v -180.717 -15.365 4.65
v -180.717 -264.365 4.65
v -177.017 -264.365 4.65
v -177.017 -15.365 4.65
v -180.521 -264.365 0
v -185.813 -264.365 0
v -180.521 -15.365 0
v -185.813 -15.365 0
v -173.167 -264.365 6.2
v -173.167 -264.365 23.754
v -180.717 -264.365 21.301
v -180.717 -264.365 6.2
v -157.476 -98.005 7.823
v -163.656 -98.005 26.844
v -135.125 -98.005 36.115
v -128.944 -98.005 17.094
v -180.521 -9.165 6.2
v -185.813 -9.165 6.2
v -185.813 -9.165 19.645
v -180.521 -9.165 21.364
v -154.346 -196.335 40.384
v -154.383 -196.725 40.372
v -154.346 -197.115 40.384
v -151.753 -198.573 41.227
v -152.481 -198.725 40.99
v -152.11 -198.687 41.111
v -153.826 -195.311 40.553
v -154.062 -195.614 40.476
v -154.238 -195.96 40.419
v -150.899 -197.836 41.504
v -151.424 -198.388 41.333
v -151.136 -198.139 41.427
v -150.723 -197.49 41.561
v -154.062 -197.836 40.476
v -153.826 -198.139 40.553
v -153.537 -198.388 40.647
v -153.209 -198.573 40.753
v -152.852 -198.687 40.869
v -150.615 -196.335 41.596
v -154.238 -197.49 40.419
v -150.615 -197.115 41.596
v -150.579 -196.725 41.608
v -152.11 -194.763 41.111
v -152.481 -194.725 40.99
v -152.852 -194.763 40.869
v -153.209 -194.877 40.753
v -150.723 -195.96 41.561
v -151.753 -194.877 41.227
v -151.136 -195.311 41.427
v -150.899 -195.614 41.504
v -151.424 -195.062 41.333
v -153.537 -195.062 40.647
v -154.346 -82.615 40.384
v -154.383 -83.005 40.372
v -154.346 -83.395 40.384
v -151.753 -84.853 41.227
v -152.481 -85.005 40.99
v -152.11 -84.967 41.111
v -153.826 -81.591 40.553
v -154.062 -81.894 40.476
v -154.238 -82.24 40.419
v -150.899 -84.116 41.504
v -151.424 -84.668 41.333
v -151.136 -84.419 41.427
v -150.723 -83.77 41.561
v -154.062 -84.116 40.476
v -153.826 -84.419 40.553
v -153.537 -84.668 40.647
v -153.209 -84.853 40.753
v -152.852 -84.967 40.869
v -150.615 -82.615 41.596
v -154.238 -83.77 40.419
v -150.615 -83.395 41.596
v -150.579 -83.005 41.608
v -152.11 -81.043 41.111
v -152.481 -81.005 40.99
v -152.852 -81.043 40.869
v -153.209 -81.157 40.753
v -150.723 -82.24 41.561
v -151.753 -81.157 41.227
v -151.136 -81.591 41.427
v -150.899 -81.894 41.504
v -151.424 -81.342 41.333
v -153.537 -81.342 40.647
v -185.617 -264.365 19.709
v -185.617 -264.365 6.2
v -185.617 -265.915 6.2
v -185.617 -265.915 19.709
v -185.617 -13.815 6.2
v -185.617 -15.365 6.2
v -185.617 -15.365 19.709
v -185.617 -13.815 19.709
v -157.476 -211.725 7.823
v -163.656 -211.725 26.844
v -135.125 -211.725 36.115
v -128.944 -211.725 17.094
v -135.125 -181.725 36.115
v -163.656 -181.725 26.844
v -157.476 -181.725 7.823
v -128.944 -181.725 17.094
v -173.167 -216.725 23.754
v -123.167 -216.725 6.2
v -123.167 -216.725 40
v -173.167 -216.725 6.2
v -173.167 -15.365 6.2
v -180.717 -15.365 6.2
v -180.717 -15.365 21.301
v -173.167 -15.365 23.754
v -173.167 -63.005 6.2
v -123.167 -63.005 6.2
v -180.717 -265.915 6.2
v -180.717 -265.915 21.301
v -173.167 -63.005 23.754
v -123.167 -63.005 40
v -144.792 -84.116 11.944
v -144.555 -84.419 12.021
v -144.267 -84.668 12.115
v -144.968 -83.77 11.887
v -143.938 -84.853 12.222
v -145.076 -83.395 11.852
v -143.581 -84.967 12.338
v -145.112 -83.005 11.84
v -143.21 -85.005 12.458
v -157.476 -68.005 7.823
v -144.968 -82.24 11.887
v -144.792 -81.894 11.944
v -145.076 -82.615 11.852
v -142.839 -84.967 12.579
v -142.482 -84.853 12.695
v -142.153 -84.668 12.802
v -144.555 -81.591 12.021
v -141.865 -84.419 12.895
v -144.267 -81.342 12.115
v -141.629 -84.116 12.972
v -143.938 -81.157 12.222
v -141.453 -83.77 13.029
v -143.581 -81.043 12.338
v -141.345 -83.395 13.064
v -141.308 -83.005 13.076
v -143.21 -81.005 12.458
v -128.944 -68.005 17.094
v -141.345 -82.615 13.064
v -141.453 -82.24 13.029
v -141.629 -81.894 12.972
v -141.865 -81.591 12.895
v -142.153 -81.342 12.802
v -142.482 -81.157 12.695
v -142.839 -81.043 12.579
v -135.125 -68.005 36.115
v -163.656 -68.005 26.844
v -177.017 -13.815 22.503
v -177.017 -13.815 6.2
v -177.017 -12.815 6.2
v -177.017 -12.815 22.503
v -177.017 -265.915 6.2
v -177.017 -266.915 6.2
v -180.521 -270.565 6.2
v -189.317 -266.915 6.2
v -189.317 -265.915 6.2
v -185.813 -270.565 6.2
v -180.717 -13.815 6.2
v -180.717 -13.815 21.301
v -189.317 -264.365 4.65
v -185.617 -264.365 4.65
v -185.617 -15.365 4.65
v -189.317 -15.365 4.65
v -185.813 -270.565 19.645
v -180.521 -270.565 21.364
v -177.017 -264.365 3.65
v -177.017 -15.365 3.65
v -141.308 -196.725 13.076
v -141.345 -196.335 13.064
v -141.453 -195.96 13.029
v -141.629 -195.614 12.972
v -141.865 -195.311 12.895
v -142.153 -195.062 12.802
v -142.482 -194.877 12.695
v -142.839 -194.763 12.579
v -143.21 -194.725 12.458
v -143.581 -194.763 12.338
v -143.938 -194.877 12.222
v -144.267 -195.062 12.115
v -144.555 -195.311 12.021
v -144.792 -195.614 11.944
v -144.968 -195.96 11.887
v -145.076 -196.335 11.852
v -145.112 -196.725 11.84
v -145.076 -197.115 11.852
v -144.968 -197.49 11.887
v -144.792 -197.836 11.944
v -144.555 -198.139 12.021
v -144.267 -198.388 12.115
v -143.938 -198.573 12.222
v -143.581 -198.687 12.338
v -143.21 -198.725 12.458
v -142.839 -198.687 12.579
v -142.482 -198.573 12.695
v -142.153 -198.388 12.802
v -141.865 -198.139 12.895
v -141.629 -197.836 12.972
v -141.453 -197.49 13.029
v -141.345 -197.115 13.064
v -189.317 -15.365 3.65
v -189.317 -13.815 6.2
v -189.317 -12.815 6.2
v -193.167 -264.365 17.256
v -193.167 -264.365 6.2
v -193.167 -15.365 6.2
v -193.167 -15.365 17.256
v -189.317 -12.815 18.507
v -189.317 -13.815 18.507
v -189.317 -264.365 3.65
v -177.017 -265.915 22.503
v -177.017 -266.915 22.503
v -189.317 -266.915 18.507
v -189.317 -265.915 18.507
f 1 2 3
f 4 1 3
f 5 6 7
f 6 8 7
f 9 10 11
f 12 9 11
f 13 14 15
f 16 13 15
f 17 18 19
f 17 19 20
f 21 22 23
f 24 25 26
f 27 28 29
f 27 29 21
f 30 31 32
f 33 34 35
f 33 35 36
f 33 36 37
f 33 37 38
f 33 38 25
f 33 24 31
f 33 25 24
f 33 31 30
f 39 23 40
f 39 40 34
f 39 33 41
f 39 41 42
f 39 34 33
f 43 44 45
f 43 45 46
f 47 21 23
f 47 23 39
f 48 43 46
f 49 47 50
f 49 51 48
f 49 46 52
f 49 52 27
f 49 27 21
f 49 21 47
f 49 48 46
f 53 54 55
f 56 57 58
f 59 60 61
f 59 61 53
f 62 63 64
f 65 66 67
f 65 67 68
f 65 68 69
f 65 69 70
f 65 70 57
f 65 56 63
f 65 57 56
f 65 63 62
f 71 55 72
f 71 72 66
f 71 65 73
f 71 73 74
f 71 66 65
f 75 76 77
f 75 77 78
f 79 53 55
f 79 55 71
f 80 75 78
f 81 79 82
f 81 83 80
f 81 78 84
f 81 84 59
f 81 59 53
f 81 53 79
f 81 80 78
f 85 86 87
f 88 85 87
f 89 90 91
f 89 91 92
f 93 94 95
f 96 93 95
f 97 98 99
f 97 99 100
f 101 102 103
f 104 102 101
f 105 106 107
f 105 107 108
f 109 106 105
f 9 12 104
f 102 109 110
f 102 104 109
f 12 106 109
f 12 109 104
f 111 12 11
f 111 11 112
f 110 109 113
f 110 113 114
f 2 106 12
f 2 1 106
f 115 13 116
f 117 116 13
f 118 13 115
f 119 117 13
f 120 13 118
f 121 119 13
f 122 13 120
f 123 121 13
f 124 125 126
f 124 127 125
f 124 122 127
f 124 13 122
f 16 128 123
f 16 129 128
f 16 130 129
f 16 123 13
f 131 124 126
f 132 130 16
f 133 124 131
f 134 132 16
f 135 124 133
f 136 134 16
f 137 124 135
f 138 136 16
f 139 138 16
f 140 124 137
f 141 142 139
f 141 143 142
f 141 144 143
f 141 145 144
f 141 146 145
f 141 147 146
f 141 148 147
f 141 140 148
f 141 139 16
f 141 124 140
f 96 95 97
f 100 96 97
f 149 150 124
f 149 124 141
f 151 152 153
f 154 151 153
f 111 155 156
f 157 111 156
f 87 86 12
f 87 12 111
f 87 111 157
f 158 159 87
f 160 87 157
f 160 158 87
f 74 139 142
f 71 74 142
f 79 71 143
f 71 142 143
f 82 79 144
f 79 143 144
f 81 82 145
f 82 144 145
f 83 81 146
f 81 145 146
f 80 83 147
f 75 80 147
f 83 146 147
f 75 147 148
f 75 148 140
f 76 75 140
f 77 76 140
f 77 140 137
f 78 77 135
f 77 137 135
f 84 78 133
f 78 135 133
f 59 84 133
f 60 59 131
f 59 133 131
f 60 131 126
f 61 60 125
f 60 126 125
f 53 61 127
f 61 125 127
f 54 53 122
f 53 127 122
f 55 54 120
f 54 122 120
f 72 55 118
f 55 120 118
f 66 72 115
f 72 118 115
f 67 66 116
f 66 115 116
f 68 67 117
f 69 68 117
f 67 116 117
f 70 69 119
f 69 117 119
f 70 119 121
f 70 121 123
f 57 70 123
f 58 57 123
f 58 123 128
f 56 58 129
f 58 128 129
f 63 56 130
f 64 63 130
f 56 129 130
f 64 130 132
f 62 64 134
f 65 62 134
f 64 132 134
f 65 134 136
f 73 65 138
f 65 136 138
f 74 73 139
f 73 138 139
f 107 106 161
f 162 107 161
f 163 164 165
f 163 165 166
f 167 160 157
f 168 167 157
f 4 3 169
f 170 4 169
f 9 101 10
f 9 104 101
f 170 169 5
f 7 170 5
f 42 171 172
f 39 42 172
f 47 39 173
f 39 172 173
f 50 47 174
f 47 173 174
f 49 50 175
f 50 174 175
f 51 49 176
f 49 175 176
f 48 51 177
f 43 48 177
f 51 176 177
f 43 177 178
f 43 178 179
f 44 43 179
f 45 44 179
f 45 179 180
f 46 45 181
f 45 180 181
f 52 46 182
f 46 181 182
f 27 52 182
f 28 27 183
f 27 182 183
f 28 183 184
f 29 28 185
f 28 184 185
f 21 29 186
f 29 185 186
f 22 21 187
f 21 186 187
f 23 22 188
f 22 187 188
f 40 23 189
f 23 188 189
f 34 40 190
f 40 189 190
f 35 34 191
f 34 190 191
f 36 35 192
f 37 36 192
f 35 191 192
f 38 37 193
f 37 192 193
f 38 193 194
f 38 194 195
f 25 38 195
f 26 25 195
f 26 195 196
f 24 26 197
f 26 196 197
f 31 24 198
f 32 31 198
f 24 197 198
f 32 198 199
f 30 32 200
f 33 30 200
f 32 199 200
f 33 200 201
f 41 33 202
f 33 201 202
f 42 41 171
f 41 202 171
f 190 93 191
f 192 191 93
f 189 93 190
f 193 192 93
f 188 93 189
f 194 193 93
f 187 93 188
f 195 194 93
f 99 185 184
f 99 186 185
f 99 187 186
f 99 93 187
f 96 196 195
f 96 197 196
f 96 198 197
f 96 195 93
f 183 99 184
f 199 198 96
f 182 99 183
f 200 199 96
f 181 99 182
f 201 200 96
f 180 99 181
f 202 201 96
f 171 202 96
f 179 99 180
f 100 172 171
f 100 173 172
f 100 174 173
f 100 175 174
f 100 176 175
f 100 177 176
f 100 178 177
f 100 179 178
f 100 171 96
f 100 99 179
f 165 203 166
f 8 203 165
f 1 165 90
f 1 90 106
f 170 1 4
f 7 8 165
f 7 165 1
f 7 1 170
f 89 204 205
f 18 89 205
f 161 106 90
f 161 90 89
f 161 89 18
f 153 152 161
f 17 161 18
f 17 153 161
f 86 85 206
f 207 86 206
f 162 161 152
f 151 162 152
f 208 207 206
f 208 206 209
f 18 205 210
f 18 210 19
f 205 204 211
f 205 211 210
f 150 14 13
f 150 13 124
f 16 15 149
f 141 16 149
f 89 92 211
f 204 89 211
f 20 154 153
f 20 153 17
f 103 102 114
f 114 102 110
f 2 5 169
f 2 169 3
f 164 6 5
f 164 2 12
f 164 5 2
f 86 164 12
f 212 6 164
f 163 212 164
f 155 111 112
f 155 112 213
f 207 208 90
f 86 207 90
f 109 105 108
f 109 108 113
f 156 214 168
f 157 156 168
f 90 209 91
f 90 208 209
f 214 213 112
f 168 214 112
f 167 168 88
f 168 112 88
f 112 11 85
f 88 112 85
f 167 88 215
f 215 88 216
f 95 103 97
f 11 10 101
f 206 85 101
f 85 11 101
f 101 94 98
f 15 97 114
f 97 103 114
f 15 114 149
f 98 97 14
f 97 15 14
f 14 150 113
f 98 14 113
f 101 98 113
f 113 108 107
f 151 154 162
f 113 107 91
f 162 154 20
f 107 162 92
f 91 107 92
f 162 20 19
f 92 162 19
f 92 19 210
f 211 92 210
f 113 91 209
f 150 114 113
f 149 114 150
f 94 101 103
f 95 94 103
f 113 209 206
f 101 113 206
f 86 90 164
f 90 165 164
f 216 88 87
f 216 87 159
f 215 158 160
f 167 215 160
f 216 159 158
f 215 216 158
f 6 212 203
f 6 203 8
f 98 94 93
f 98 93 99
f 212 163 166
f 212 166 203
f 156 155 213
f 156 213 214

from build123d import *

# Parameters (mm, degrees)
ESQUISSE1_W                   = 70
ESQUISSE1_H                   = 261.4
BOSS_EXTRU_1_DEPTH            = 40
ENL_V_MAT_EXTRU_1_DEPTH       = 335.841640665
ENL_V_MAT_EXTRU_1_DEPTH_BACK  = 40
ENL_V_MAT_EXTRU_2_DEPTH       = 335.841640665
ENL_V_MAT_EXTRU_2_DEPTH_BACK  = 40
ENL_V_MAT_EXTRU_3_DEPTH       = 287.347052656
ENL_V_MAT_EXTRU_3_DEPTH_BACK  = 165
ENL_V_MAT_EXTRU_4_DEPTH       = 328.480443637
ENL_V_MAT_EXTRU_4_DEPTH_BACK  = 261.4
ENL_V_MAT_EXTRU_5_DEPTH       = 328.480443637
ENL_V_MAT_EXTRU_5_DEPTH_BACK  = 261.4
ENL_V_MAT_EXTRU_6_DEPTH       = 335.841640665
ENL_V_MAT_EXTRU_6_DEPTH_BACK  = 40
ENL_V_MAT_EXTRU_8_DEPTH       = 335.841640665
ENL_V_MAT_EXTRU_8_DEPTH_BACK  = 40
ENL_V_MAT_EXTRU_9_DEPTH       = 281.544908808
ENL_V_MAT_EXTRU_9_DEPTH_BACK  = 40
ENL_V_MAT_EXTRU_10_DEPTH      = 335.841640665
ENL_V_MAT_EXTRU_10_DEPTH_BACK = 40
ENL_V_MAT_EXTRU_12_DEPTH      = 335.841640665
ENL_V_MAT_EXTRU_12_DEPTH_BACK = 40
ENL_V_MAT_EXTRU_14_DEPTH      = 280.494983601
ENL_V_MAT_EXTRU_14_DEPTH_BACK = 4.9
ENL_V_MAT_EXTRU_30_DEPTH      = 323.553128903
ENL_V_MAT_EXTRU_30_DEPTH_BACK = 323.553128903
ESQUISSE33_W                  = 30
ESQUISSE33_H                  = 30
ENL_V_MAT_EXTRU_34_DEPTH      = 20
ESQUISSE36_W                  = 30
ESQUISSE36_H                  = 30
ENL_V_MAT_EXTRU_35_DEPTH      = 20
ESQUISSE38_R                  = 2
BOSS_EXTRU_2_DEPTH            = 30
ESQUISSE39_R                  = 2
BOSS_EXTRU_3_DEPTH            = 30


with BuildPart() as part:
    # Esquisse1 → Boss.-Extru.1 (new body)
    with BuildSketch(Plane.XY):
        with Locations((-158.166976901, -139.865044598)):
            Rectangle(ESQUISSE1_W, ESQUISSE1_H)
    extrude(amount=BOSS_EXTRU_1_DEPTH)

    # Esquisse3 → Enlèv. mat.-Extru.1 (cut, two sides: drawn at the far end of the back side and taken through both)
    with BuildSketch(Plane.XY.offset(40).offset(-ENL_V_MAT_EXTRU_1_DEPTH_BACK)):
        Polygon((-173.166976901, 533.112927894), (-173.166976901, -9.165044598), (-173.166976901, -63.005044598), (-123.166976901, -63.005044598), (419.110995591, -63.005044598), (1188.481875045, 701.409795425), (596.203902553, 1297.527767917), align=None)
    extrude(amount=ENL_V_MAT_EXTRU_1_DEPTH + ENL_V_MAT_EXTRU_1_DEPTH_BACK, mode=Mode.SUBTRACT)

    # Esquisse4 → Enlèv. mat.-Extru.2 (cut, two sides: drawn at the far end of the back side and taken through both)
    with BuildSketch(Plane.XY.offset(40).offset(-ENL_V_MAT_EXTRU_2_DEPTH_BACK)):
        Polygon((-173.166976901, -812.84301709), (-173.166976901, -270.565044598), (-173.166976901, -216.725044598), (-123.166976901, -216.725044598), (419.110995591, -216.725044598), (1188.481875045, -981.139884621), (596.203902553, -1577.257857113), align=None)
    extrude(amount=ENL_V_MAT_EXTRU_2_DEPTH + ENL_V_MAT_EXTRU_2_DEPTH_BACK, mode=Mode.SUBTRACT)

    # Esquisse6 → Enlèv. mat.-Extru.3 (cut, two sides: drawn at the far end of the back side and taken through both)
    with BuildSketch(Plane(origin=(0, -63.005044598, 0), x_dir=(1, 0, 0), z_dir=(0, 1, 0)).offset(-ENL_V_MAT_EXTRU_3_DEPTH_BACK)):
        Polygon((42.299289537, -6.2), (-123.166976901, -6.2), (-173.166976901, -6.2), (-173.166976901, 0), (-173.166976901, 165.466266437), (33.046852916, 424.294776666), (248.513119354, 252.628510228), align=None)
    extrude(amount=ENL_V_MAT_EXTRU_3_DEPTH + ENL_V_MAT_EXTRU_3_DEPTH_BACK, mode=Mode.SUBTRACT)

    # Esquisse7 → Enlèv. mat.-Extru.4 (cut, two sides: drawn at the far end of the back side and taken through both)
    with BuildSketch(Plane(origin=(0, -9.165044598, 0), x_dir=(1, 0, 0), z_dir=(0, 1, 0)).offset(-ENL_V_MAT_EXTRU_4_DEPTH_BACK)):
        Polygon((-23.31660268, -6.2), (-173.166976901, -6.2), (-180.716976901, -6.2), (-180.716976901, -4.65), (-177.016976901, -4.65), (-177.016976901, -3.65), (-180.521416942, 0), (-284.304352032, 108.093649388), (-164.080204276, 382.623598415), (96.907545076, 268.329949026), align=None)
    extrude(amount=ENL_V_MAT_EXTRU_4_DEPTH + ENL_V_MAT_EXTRU_4_DEPTH_BACK, mode=Mode.SUBTRACT)

    # Esquisse8 → Enlèv. mat.-Extru.5 (cut, two sides: drawn at the far end of the back side and taken through both)
    with BuildSketch(Plane(origin=(0, -9.165044598, 0), x_dir=(1, 0, 0), z_dir=(0, 1, 0)).offset(-ENL_V_MAT_EXTRU_5_DEPTH_BACK)):
        Polygon((-358.633243338, -6.2), (-193.166976901, -6.2), (-185.616976901, -6.2), (-185.616976901, -4.65), (-189.316976901, -4.65), (-189.316976901, -3.65), (-185.81253686, 0), (-71.214392687, 119.358077569), (-203.692164198, 422.617012095), (-491.11101485, 297.058934527), align=None)
    extrude(amount=ENL_V_MAT_EXTRU_5_DEPTH + ENL_V_MAT_EXTRU_5_DEPTH_BACK, mode=Mode.SUBTRACT)

    # Esquisse9 → Enlèv. mat.-Extru.6 (cut, two sides: drawn at the far end of the back side and taken through both)
    with BuildSketch(Plane.XY.offset(40).offset(-ENL_V_MAT_EXTRU_6_DEPTH_BACK)):
        Polygon((-740.770645722, -15.365044598), (-193.166976901, -15.365044598), (-185.616976901, -15.365044598), (-185.616976901, -13.815044598), (-189.316976901, -13.815044598), (-189.316976901, -12.815044598), (-185.81253686, -9.165044598), (193.445214828, 385.845507022), (-238.735419917, 1392.174981587), (-1172.951280468, 990.964429967), align=None)
    extrude(amount=ENL_V_MAT_EXTRU_6_DEPTH + ENL_V_MAT_EXTRU_6_DEPTH_BACK, mode=Mode.SUBTRACT)

    # Esquisse10 → Enlèv. mat.-Extru.8 (cut, two sides: drawn at the far end of the back side and taken through both)
    with BuildSketch(Plane.XY.offset(40).offset(-ENL_V_MAT_EXTRU_8_DEPTH_BACK)):
        Polygon((372.069388801, -15.365044598), (-173.166976901, -15.365044598), (-180.716976901, -15.365044598), (-180.716976901, -13.815044598), (-177.016976901, -13.815044598), (-177.016976901, -12.815044598), (-180.521416942, -9.165044598), (-558.13962874, 384.13786742), (-127.815363107, 1386.111821344), (802.393654434, 986.608909326), align=None)
    extrude(amount=ENL_V_MAT_EXTRU_8_DEPTH + ENL_V_MAT_EXTRU_8_DEPTH_BACK, mode=Mode.SUBTRACT)

    # Esquisse11 → Enlèv. mat.-Extru.9 (cut, two sides: drawn at the far end of the back side and taken through both)
    with BuildSketch(Plane.ZY.offset(185.616976901).offset(-ENL_V_MAT_EXTRU_9_DEPTH_BACK)):
        Polygon((-537.152349895, -15.365044598), (0, -15.365044598), (6.2, -15.365044598), (6.2, -9.165044598), (6.2, 527.987305297), (-753.448138282, 1287.635443579), (-1296.800488177, 744.283093684), align=None)
    extrude(amount=ENL_V_MAT_EXTRU_9_DEPTH + ENL_V_MAT_EXTRU_9_DEPTH_BACK, mode=Mode.SUBTRACT)

    # Esquisse12 → Enlèv. mat.-Extru.10 (cut, two sides: drawn at the far end of the back side and taken through both)
    with BuildSketch(Plane.XY.offset(40).offset(-ENL_V_MAT_EXTRU_10_DEPTH_BACK)):
        Polygon((372.069388801, -264.365044598), (-173.166976901, -264.365044598), (-180.716976901, -264.365044598), (-180.716976901, -265.915044598), (-177.016976901, -265.915044598), (-177.016976901, -266.915044598), (-180.521416942, -270.565044598), (-558.13962874, -663.867956616), (-127.815363107, -1665.84191054), (802.393654434, -1266.338998522), align=None)
    extrude(amount=ENL_V_MAT_EXTRU_10_DEPTH + ENL_V_MAT_EXTRU_10_DEPTH_BACK, mode=Mode.SUBTRACT)

    # Esquisse13 → Enlèv. mat.-Extru.12 (cut, two sides: drawn at the far end of the back side and taken through both)
    with BuildSketch(Plane.XY.offset(40).offset(-ENL_V_MAT_EXTRU_12_DEPTH_BACK)):
        Polygon((-740.770645722, -264.365044598), (-193.166976901, -264.365044598), (-185.616976901, -264.365044598), (-185.616976901, -265.915044598), (-189.316976901, -265.915044598), (-189.316976901, -266.915044598), (-185.81253686, -270.565044598), (193.445214828, -665.575596218), (-238.735419917, -1671.905070783), (-1172.951280468, -1270.694519163), align=None)
    extrude(amount=ENL_V_MAT_EXTRU_12_DEPTH + ENL_V_MAT_EXTRU_12_DEPTH_BACK, mode=Mode.SUBTRACT)

    # Esquisse16 → Enlèv. mat.-Extru.14 (cut, two sides: drawn at the far end of the back side and taken through both)
    with BuildSketch(Plane(origin=(-180.716976901, 0, 0), x_dir=(0, 0, -1), z_dir=(1, 0, 0)).offset(-ENL_V_MAT_EXTRU_14_DEPTH_BACK)):
        Polygon((537.152349895, -264.365044598), (0, -264.365044598), (-6.2, -264.365044598), (-6.2, -270.565044598), (-6.2, -807.717394493), (753.448138282, -1567.365532776), (1296.800488177, -1024.01318288), align=None)
    extrude(amount=ENL_V_MAT_EXTRU_14_DEPTH + ENL_V_MAT_EXTRU_14_DEPTH_BACK, mode=Mode.SUBTRACT)


with BuildPart() as enl_v_mat_extru_14_kept_piece:
    # of the separate pieces the step leaves, the one the design keeps (enl_v_mat_extru_14_pieces_kept)
    add(part.part.solids().sort_by_distance((-193.166976901, -264.365044598, 6.2))[0])

    # Esquisse32 → Enlèv. mat.-Extru.30 (cut, two sides: drawn at the far end of the back side and taken through both)
    with BuildSketch(Plane(origin=(0, -264.365044598, 0), x_dir=(-1, 0, 0), z_dir=(0, -1, 0)).offset(-ENL_V_MAT_EXTRU_30_DEPTH_BACK)):
        Polygon((364.412131867, -40), (193.166976901, -40), (123.166976901, -40), (193.166976901, -17.255621264), (356.030797415, 35.662041825), (696.438947848, 73.370177768), (704.8202823, -2.291864057), align=None)
    extrude(amount=ENL_V_MAT_EXTRU_30_DEPTH + ENL_V_MAT_EXTRU_30_DEPTH_BACK, mode=Mode.SUBTRACT)

    # Esquisse33 → Enlèv. mat.-Extru.34 (cut)
    with BuildSketch(Plane(origin=(-23.517104767, 0, 72.378206183), x_dir=(0.9510565162951555, 0, 0.3090169943749416), z_dir=(-0.3090169943749416, 0, 0.9510565162951555))):
        with Locations((-132.351187411, -83.005044598)):
            Rectangle(ESQUISSE33_W, ESQUISSE33_H)
    extrude(amount=-ENL_V_MAT_EXTRU_34_DEPTH, mode=Mode.SUBTRACT)

    # Esquisse36 → Enlèv. mat.-Extru.35 (cut)
    with BuildSketch(Plane(origin=(-23.517104767, 0, 72.378206183), x_dir=(0.9510565162951555, 0, 0.3090169943749416), z_dir=(-0.3090169943749416, 0, 0.9510565162951555))):
        with Locations((-132.351187411, -196.725044598)):
            Rectangle(ESQUISSE36_W, ESQUISSE36_H)
    extrude(amount=-ENL_V_MAT_EXTRU_35_DEPTH, mode=Mode.SUBTRACT)

    # Esquisse38 → Boss.-Extru.2 (add)
    with BuildSketch(Plane(origin=(-17.336764879, 0, 53.357075857), x_dir=(0.9510565162951555, 0, 0.3090169943749415), z_dir=(-0.3090169943749415, 0, 0.9510565162951556))):
        with Locations((-132.351187411, -83.005044598)):
            Circle(ESQUISSE38_R)
    extrude(amount=BOSS_EXTRU_2_DEPTH)

    # Esquisse39 → Boss.-Extru.3 (add)
    with BuildSketch(Plane(origin=(-17.336764879, 0, 53.357075857), x_dir=(0.9510565162951555, 0, 0.3090169943749415), z_dir=(-0.3090169943749415, 0, 0.9510565162951556))):
        with Locations((-132.351187411, -196.725044598)):
            Circle(ESQUISSE39_R)
    extrude(amount=BOSS_EXTRU_3_DEPTH)


solid = enl_v_mat_extru_14_kept_piece.part
